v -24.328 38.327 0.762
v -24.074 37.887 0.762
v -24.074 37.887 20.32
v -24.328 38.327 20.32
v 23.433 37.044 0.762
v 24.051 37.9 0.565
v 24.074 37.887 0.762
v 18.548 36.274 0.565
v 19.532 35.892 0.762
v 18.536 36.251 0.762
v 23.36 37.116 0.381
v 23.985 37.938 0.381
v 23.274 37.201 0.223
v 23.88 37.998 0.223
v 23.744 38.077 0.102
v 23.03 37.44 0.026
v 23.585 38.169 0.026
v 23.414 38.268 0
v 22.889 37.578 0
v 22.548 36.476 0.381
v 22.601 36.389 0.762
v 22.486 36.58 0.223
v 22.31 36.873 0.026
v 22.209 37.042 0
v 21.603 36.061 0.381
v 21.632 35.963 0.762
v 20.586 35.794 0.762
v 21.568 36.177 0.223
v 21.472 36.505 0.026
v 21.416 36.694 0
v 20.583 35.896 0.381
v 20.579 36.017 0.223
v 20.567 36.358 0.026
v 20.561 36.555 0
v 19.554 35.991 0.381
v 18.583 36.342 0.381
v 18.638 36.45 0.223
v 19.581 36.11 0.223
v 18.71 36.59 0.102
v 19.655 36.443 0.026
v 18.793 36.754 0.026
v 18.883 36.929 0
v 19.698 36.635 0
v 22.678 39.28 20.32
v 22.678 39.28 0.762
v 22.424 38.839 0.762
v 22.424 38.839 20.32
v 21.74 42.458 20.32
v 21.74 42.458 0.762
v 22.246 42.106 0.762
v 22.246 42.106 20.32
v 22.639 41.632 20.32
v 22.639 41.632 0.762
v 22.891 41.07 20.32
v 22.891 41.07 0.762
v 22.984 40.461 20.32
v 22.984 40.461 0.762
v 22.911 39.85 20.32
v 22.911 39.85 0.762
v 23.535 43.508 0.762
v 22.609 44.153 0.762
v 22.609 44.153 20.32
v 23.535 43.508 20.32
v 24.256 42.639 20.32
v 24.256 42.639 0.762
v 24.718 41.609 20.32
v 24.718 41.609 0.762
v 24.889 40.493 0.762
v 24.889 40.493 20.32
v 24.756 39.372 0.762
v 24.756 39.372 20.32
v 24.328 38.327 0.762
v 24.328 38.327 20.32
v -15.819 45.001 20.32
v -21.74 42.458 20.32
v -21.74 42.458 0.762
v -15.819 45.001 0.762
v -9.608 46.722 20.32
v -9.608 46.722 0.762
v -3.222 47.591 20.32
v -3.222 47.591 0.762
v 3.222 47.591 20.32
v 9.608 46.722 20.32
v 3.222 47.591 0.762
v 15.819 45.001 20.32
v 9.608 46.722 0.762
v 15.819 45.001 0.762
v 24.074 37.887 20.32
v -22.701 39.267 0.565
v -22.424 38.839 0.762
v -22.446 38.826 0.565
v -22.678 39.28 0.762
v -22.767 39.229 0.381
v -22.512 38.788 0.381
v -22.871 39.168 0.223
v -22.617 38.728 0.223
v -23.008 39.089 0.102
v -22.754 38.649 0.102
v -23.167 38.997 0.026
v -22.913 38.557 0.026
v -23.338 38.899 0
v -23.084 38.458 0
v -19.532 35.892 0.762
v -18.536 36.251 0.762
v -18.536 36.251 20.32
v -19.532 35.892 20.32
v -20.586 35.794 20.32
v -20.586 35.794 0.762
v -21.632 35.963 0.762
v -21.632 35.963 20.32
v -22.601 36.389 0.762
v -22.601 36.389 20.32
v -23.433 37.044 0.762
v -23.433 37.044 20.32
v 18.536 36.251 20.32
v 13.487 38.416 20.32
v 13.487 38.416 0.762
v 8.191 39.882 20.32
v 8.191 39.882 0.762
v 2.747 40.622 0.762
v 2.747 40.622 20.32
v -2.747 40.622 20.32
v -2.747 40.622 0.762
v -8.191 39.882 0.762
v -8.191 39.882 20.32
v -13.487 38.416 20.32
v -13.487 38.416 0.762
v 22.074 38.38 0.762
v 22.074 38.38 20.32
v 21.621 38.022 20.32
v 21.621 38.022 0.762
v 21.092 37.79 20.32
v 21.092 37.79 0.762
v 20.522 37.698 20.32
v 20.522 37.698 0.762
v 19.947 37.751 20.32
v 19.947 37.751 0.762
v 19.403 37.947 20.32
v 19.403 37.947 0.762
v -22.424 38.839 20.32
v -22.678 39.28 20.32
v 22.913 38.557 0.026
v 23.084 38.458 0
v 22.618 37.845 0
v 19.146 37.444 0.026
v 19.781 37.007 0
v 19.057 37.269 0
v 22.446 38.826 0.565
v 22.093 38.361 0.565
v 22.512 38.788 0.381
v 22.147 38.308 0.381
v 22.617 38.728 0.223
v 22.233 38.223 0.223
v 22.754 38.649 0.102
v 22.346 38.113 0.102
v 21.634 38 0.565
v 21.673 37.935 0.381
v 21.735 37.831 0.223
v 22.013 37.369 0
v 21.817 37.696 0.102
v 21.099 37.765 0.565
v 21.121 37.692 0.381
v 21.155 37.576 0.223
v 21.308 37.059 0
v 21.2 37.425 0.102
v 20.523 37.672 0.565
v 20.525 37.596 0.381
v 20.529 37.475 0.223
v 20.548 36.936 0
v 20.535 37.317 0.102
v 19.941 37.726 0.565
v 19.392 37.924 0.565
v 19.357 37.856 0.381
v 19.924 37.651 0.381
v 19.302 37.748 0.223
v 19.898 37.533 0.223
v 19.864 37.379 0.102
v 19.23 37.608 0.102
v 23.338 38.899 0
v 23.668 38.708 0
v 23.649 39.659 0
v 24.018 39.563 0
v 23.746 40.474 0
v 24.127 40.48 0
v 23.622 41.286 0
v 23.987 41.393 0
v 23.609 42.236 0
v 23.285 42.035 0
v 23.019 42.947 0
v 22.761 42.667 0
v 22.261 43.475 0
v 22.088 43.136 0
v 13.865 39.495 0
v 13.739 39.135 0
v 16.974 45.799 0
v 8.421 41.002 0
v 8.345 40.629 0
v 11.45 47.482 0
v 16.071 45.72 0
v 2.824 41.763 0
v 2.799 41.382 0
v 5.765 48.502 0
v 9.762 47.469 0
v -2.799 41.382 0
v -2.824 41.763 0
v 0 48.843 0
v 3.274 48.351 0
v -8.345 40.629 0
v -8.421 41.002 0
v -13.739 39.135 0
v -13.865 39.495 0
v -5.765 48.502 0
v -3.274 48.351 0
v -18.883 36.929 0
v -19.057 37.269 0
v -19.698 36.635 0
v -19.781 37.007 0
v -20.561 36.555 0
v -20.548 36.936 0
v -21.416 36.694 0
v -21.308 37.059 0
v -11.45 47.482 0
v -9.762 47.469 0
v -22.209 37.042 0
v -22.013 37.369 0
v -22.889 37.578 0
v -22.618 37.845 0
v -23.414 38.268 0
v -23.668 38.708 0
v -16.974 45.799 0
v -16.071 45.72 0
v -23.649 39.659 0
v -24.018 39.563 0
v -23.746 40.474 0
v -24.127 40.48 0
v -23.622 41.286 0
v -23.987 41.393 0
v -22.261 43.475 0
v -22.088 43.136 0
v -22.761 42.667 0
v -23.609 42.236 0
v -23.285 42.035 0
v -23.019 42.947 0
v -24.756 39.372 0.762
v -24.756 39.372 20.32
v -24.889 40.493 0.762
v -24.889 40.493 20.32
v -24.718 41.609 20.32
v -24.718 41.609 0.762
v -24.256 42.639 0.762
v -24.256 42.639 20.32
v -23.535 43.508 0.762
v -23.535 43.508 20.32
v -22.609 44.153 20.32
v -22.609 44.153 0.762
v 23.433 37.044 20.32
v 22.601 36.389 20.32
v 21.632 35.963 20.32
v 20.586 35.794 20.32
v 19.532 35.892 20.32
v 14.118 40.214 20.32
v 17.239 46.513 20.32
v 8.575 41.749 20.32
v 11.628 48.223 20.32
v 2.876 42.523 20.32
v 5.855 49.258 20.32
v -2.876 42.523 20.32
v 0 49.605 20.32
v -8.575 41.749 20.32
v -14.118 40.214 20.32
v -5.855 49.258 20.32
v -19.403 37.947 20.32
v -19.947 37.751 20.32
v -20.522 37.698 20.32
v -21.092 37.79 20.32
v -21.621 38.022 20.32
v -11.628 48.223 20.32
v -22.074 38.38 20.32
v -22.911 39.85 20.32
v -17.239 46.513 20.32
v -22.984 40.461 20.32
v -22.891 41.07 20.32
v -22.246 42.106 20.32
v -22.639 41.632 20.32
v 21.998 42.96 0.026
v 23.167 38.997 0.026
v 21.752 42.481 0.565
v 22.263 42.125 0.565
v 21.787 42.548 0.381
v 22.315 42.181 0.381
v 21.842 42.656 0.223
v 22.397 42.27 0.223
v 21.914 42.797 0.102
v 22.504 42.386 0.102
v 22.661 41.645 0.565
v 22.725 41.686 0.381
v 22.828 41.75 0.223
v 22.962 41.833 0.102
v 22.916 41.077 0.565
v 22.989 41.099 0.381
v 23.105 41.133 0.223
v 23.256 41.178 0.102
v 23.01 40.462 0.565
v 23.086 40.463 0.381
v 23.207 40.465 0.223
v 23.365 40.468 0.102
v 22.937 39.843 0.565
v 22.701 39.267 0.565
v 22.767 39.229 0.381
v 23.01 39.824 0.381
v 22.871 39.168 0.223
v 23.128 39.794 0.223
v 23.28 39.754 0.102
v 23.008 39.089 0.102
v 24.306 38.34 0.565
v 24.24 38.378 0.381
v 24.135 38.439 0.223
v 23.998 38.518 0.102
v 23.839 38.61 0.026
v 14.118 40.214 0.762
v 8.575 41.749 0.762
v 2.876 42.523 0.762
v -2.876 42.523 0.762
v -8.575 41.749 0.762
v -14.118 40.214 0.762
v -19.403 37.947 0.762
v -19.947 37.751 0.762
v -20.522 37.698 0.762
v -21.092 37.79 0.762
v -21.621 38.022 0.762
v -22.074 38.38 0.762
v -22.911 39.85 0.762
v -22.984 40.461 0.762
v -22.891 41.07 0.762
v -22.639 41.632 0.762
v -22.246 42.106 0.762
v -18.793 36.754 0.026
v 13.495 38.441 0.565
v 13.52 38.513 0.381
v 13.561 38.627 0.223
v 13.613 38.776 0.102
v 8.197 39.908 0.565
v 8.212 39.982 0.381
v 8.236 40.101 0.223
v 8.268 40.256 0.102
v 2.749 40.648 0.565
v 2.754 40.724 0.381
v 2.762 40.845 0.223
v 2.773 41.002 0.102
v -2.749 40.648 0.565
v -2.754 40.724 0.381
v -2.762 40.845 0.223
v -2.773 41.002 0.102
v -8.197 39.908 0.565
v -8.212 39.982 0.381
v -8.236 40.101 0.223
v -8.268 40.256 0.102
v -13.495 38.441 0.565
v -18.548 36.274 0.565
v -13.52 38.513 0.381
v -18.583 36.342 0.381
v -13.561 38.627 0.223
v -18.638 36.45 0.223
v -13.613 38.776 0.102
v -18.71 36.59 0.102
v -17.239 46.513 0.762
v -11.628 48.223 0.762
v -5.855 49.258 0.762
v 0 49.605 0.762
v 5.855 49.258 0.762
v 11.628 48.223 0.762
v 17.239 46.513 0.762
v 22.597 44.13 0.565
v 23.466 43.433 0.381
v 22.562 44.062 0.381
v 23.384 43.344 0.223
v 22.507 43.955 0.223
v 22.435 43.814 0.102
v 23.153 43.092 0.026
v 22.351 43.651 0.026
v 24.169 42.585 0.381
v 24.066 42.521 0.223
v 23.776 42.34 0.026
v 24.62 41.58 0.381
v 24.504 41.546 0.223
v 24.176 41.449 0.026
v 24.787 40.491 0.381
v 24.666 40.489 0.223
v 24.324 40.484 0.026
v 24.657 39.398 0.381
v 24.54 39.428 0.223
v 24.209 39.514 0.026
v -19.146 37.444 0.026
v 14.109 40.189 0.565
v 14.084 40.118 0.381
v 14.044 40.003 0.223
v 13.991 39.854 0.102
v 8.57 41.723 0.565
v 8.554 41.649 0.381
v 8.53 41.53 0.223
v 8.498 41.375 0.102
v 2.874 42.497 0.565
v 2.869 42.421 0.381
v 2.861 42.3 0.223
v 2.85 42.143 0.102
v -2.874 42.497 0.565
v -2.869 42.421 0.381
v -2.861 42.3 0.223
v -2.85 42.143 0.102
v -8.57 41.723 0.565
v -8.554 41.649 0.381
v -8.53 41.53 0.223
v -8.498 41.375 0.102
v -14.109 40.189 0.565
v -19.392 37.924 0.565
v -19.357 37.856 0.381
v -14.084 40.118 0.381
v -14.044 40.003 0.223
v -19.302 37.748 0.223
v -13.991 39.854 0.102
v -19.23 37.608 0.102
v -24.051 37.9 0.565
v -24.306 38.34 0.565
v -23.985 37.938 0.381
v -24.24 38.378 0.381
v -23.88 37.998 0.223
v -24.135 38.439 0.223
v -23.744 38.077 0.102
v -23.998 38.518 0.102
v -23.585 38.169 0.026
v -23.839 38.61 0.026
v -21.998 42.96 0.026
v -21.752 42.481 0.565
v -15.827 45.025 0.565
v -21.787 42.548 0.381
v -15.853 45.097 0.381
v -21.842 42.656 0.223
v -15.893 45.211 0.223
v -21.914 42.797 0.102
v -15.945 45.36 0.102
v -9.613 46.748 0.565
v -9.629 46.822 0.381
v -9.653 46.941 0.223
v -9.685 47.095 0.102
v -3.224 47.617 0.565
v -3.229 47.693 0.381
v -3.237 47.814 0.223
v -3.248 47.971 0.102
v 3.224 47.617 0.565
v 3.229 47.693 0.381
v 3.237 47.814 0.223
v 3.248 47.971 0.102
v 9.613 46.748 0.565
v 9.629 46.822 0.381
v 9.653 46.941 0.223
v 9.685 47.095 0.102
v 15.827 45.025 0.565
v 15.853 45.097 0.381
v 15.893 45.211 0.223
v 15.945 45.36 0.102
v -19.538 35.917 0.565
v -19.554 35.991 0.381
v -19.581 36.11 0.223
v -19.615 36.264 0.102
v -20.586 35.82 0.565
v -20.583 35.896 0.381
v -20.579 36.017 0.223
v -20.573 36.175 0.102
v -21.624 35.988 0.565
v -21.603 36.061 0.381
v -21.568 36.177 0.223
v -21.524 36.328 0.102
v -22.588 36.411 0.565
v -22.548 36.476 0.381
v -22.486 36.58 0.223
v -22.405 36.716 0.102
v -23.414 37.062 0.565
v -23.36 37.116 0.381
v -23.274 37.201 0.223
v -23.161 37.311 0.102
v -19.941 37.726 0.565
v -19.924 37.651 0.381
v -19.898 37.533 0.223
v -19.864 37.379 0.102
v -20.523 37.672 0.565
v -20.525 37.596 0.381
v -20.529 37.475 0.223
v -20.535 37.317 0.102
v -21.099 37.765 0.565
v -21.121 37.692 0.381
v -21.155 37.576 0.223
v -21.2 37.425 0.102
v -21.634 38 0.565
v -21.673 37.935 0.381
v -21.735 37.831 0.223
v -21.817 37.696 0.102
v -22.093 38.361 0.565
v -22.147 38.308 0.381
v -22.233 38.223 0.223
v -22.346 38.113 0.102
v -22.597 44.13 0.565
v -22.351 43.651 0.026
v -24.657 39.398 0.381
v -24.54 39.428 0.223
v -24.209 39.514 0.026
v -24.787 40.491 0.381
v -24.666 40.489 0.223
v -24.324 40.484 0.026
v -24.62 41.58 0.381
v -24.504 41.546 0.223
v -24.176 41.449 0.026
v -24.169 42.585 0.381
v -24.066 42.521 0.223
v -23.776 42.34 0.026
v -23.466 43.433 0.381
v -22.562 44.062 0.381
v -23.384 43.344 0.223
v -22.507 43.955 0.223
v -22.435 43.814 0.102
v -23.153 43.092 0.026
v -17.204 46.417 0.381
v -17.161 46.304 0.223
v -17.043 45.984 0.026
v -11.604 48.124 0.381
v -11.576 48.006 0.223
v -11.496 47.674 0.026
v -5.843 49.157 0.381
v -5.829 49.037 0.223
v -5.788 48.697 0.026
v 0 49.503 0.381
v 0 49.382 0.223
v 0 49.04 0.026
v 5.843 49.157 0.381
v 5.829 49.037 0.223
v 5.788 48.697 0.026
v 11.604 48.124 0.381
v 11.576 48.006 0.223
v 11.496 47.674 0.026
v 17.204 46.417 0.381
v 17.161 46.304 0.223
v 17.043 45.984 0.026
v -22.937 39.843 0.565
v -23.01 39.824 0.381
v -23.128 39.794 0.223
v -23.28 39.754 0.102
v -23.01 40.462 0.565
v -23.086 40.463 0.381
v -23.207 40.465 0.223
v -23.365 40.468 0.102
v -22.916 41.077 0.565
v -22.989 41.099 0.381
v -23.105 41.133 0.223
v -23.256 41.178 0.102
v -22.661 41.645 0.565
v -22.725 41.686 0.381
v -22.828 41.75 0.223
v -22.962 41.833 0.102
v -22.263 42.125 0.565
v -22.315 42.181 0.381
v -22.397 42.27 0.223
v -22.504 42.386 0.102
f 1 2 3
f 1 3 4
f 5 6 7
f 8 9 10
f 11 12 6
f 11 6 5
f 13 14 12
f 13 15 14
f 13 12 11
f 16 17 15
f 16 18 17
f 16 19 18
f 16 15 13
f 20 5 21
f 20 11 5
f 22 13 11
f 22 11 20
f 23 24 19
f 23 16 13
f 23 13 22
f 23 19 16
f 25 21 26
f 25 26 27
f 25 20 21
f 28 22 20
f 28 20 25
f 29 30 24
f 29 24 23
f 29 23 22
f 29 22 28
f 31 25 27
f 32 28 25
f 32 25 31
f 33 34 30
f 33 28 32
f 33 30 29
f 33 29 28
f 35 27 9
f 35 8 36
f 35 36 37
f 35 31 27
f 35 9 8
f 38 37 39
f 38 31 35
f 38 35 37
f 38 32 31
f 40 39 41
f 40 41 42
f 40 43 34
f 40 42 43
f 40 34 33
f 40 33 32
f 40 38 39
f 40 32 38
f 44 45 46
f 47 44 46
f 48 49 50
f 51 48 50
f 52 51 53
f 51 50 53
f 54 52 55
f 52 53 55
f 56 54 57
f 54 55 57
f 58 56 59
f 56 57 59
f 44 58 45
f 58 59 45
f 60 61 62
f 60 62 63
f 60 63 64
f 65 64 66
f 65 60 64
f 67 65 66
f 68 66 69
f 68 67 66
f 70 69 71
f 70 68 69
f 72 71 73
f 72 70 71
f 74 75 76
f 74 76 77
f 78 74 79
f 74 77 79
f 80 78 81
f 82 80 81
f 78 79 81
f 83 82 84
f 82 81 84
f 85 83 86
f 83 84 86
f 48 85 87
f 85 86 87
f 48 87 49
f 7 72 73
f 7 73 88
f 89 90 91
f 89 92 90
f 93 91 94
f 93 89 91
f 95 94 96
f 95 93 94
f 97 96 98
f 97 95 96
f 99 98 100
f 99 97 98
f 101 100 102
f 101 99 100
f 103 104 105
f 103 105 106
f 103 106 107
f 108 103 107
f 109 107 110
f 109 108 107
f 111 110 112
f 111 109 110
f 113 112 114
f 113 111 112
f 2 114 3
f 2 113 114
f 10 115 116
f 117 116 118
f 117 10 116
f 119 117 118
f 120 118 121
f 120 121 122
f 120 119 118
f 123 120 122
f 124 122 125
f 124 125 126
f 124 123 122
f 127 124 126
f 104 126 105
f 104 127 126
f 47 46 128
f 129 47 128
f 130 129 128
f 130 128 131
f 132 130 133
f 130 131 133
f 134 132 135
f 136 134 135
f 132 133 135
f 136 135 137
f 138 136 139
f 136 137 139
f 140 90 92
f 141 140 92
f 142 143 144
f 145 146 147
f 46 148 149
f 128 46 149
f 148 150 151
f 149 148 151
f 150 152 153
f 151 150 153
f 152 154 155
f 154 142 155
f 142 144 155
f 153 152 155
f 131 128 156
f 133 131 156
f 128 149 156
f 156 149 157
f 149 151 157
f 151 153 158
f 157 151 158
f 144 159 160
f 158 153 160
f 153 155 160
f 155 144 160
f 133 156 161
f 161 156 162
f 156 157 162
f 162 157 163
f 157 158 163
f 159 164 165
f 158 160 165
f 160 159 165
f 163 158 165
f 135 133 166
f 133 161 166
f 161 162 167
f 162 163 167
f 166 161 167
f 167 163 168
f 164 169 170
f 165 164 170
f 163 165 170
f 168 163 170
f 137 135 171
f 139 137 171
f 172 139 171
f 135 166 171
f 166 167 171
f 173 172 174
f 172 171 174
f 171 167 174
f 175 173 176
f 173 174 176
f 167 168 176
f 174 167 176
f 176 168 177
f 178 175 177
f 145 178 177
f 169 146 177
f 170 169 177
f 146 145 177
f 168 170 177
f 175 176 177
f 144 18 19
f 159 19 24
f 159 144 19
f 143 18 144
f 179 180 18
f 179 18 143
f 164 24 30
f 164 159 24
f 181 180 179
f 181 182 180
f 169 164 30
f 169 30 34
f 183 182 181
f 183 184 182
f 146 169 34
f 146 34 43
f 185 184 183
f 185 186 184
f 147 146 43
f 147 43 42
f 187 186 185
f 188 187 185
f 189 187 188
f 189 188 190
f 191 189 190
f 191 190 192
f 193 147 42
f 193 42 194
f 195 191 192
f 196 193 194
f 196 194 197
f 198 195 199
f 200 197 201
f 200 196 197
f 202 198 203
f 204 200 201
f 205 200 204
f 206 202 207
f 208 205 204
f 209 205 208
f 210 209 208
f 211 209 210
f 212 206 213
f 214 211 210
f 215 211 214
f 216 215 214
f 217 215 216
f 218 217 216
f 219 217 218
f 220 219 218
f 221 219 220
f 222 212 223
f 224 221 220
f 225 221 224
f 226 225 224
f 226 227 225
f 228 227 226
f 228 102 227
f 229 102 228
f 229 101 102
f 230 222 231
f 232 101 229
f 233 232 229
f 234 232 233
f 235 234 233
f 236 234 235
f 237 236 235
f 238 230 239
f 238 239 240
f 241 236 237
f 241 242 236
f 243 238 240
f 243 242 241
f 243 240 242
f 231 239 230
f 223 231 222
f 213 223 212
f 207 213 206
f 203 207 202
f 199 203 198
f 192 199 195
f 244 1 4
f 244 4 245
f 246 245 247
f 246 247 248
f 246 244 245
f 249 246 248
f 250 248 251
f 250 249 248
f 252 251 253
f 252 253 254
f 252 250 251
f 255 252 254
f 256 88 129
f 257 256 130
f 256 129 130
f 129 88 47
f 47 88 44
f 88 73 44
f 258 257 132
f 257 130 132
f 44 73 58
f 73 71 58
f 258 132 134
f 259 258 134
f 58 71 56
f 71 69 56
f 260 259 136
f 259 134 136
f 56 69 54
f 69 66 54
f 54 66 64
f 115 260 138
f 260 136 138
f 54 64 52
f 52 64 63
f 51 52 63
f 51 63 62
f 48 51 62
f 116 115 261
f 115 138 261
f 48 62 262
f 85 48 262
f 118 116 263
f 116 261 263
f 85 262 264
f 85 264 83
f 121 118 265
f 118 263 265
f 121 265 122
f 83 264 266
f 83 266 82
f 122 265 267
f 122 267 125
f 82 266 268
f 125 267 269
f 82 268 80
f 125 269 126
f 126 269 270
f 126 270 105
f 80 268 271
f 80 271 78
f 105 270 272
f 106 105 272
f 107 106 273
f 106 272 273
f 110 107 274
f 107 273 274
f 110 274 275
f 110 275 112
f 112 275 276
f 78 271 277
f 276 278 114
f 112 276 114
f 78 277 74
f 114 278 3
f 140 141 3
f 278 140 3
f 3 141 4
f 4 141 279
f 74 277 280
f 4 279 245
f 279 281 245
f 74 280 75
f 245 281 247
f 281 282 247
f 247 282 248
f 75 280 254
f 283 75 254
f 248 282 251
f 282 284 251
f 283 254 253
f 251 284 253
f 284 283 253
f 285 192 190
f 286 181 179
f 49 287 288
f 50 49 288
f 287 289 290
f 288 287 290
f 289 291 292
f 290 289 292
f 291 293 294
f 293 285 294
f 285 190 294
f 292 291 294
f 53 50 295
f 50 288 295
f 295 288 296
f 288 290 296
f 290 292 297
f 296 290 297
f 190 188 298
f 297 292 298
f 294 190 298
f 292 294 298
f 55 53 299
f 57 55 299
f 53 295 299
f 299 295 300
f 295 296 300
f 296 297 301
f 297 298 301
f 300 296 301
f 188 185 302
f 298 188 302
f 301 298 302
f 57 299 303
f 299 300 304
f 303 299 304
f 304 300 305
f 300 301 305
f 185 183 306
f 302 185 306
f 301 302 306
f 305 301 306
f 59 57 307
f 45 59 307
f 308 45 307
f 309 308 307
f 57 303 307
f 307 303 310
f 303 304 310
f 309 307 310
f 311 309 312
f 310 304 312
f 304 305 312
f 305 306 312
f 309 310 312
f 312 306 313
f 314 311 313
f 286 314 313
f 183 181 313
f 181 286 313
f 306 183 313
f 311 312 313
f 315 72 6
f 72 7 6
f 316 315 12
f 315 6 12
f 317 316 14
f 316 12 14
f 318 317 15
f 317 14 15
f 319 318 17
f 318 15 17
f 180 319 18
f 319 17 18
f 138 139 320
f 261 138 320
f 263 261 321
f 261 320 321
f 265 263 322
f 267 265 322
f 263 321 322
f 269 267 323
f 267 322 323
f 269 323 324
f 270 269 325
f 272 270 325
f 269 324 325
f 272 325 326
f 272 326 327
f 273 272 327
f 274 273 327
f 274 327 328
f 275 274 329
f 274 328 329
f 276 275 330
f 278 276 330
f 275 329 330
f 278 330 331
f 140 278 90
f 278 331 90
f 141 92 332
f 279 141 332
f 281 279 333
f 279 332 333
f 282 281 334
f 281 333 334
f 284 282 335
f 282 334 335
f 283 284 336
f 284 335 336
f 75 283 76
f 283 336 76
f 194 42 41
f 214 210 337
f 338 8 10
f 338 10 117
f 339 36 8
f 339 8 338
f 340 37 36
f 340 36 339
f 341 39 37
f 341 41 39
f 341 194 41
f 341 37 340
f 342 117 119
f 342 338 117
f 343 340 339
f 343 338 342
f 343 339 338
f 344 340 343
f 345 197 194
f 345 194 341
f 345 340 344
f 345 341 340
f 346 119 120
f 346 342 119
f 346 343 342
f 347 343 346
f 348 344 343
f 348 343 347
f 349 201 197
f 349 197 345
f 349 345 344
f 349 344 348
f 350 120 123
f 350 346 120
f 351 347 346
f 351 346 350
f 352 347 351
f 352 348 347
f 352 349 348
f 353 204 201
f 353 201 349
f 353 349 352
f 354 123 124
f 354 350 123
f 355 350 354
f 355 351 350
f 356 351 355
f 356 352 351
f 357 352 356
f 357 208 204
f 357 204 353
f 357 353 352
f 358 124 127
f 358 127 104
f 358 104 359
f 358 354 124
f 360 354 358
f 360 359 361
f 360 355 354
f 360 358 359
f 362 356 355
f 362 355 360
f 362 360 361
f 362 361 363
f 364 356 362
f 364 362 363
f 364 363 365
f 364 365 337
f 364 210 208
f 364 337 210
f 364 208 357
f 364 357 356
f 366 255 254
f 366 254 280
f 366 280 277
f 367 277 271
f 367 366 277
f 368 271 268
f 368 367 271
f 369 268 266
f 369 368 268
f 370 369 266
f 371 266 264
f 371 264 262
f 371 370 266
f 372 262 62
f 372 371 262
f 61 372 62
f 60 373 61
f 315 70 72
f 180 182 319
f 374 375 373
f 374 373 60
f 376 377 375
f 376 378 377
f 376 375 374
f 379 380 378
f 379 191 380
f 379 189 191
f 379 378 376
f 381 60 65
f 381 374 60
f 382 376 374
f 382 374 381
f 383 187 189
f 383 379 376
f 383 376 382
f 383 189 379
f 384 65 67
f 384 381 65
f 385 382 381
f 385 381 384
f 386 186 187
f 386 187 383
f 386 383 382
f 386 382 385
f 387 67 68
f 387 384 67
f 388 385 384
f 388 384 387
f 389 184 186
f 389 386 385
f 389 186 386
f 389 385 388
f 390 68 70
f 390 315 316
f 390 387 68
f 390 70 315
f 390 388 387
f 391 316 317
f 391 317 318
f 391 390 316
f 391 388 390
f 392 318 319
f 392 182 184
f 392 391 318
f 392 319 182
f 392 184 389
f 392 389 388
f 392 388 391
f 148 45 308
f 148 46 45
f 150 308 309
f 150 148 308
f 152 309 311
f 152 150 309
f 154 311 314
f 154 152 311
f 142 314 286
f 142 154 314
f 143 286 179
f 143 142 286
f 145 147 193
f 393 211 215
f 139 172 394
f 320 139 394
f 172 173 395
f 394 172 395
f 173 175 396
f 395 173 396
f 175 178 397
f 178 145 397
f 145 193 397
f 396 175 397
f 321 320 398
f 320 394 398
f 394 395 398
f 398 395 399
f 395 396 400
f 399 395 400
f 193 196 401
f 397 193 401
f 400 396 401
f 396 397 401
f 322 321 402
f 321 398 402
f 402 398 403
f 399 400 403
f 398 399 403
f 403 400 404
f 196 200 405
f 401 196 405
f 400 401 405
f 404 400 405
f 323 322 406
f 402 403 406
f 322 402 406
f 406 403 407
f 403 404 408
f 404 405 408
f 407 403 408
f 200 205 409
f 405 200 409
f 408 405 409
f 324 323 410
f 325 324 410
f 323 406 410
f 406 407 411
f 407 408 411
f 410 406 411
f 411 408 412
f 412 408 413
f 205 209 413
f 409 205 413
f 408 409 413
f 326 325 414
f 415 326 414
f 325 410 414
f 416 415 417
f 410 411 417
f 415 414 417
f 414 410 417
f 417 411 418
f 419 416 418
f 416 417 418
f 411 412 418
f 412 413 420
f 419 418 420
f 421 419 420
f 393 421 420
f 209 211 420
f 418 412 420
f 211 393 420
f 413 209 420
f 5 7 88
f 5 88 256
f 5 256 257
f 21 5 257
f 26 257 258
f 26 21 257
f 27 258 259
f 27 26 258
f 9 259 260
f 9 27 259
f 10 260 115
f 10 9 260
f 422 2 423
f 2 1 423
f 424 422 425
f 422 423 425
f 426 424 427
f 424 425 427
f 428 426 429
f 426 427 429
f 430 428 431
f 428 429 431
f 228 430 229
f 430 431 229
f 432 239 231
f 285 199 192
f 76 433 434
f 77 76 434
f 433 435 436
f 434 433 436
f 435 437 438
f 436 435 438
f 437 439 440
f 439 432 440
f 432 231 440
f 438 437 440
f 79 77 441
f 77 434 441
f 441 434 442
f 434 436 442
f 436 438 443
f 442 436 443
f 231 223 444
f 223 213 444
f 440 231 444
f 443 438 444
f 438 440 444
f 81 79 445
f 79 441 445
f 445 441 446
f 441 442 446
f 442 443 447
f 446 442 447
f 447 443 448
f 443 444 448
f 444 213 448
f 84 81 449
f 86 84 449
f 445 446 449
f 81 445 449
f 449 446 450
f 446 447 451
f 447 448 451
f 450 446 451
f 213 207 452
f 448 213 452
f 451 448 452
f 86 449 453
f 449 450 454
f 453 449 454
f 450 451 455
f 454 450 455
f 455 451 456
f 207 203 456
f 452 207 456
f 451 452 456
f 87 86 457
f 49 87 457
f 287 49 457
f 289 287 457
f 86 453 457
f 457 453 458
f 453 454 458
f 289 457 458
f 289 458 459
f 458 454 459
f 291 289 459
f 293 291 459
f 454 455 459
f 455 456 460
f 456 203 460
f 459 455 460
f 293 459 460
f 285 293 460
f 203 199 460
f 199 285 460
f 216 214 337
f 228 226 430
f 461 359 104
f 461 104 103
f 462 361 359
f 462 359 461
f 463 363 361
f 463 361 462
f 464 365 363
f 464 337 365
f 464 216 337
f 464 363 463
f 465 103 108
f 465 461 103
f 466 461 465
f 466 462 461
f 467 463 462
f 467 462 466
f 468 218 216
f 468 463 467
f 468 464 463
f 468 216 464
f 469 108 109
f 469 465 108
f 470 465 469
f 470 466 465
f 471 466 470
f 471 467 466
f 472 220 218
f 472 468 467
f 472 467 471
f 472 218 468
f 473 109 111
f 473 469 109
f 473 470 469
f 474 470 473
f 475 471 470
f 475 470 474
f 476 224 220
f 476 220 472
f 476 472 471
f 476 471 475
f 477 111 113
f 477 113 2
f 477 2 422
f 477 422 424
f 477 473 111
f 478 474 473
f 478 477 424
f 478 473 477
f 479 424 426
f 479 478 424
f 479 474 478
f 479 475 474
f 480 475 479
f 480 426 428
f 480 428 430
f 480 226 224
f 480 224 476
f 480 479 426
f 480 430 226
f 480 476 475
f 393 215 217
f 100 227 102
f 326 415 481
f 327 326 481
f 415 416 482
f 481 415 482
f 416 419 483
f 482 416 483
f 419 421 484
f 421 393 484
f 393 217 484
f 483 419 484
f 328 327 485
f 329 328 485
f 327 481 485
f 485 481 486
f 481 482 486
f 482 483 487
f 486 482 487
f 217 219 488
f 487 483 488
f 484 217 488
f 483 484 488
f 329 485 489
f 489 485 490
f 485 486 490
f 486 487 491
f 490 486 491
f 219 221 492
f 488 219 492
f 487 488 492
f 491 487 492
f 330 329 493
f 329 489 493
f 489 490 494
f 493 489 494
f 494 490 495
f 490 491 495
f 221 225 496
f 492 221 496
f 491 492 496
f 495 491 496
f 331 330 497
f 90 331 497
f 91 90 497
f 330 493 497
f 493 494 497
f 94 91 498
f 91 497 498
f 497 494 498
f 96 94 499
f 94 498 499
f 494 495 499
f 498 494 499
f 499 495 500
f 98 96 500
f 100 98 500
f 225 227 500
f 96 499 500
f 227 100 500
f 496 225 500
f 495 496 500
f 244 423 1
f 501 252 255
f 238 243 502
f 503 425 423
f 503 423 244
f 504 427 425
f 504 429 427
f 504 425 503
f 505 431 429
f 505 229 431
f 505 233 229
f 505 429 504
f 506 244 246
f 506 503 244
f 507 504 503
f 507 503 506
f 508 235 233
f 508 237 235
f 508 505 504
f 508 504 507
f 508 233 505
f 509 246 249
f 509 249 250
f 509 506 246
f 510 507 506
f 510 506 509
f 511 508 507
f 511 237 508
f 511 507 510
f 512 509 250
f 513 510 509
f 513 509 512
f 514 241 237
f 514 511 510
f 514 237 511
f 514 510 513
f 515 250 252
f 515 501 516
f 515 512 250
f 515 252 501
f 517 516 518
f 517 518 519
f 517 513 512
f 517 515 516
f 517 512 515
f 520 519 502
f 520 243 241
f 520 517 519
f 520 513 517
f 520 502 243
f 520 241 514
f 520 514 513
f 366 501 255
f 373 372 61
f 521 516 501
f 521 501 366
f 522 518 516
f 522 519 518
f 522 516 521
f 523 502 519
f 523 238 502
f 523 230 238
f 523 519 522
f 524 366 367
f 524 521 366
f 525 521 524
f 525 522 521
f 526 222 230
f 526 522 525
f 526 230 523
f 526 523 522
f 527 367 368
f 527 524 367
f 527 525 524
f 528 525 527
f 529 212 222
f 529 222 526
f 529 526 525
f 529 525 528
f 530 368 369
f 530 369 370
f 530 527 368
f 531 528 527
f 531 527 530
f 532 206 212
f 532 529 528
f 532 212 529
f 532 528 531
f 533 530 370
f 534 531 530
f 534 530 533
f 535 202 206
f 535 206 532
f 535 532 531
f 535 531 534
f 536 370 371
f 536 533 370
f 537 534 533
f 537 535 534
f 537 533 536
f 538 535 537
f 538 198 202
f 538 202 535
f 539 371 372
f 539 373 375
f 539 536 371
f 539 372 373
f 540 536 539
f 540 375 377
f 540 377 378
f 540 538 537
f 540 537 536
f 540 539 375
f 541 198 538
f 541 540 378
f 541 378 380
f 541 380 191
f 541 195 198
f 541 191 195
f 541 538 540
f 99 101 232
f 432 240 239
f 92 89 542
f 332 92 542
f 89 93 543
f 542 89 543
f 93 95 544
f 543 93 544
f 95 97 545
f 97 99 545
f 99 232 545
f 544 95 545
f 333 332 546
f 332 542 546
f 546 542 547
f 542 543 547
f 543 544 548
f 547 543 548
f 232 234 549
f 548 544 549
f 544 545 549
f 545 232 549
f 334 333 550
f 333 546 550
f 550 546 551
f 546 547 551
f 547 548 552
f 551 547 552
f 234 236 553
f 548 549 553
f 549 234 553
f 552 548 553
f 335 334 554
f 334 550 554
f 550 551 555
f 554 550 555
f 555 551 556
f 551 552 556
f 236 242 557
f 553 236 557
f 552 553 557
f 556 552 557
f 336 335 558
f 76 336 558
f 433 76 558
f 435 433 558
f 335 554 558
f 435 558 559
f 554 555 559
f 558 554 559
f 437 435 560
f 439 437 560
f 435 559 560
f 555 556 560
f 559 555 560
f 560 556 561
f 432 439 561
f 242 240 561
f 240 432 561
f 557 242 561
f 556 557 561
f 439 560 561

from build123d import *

# Parameters (mm, degrees)
EXTRUDE_THIN2_DEPTH = 20.32
FILLET2_R           = 0.762


with BuildPart() as part:
    # Sketch1 → Extrude-Thin2 (new body)
    with BuildSketch(Plane.XY):
        with BuildLine():
            Line((24.32799261, 38.327319246), (24.073666549, 37.886813588))
            ThreePointArc((24.073666549, 37.886813588), (21.631585853, 35.963049129), (18.536136228, 36.250832801))
            ThreePointArc((18.536136228, 36.250832801), (0, 40.715), (-18.536136228, 36.250832801))
            ThreePointArc((-18.536136228, 36.250832801), (-21.631585853, 35.963049129), (-24.073666549, 37.886813588))
            Line((-24.073666549, 37.886813588), (-24.32799261, 38.327319246))
            ThreePointArc((-24.32799261, 38.327319246), (-24.718082956, 41.60910514), (-22.608625258, 44.153211536))
            ThreePointArc((-22.608625258, 44.153211536), (0, 49.605), (22.608625258, 44.153211536))
            ThreePointArc((22.608625258, 44.153211536), (24.718082956, 41.60910514), (24.32799261, 38.327319246))
        make_face()
        with BuildLine():
            Line((22.678214215, 39.279819246), (22.423888155, 38.839313588))
            ThreePointArc((22.423888155, 38.839313588), (21.091844139, 37.78998752), (19.403417071, 37.946960431))
            ThreePointArc((19.403417071, 37.946960431), (0, 42.62), (-19.403417071, 37.946960431))
            ThreePointArc((-19.403417071, 37.946960431), (-21.091844139, 37.78998752), (-22.423888155, 38.839313588))
            Line((-22.423888155, 38.839313588), (-22.678214215, 39.279819246))
            ThreePointArc((-22.678214215, 39.279819246), (-22.890990768, 41.069884279), (-21.740377478, 42.457578677))
            ThreePointArc((-21.740377478, 42.457578677), (0, 47.7), (21.740377478, 42.457578677))
            ThreePointArc((21.740377478, 42.457578677), (22.890990768, 41.069884279), (22.678214215, 39.279819246))
        make_face(mode=Mode.SUBTRACT)
    extrude(amount=EXTRUDE_THIN2_DEPTH)

    # Fillet2
    fillet2_edges = [part.edges().sort_by_distance(p)[0] for p in [
        (-21.091844139, 37.78998752, 0),
        (0, 42.62, 0),
        (21.091844139, 37.78998752, 0),
        (22.551051185, 39.059566417, 0),
        (22.890990768, 41.069884279, 0),
        (0, 47.7, 0),
        (-22.890990768, 41.069884279, 0),
        (-22.551051185, 39.059566417, 0),
        (-24.20082958, 38.107066417, 0),
        (-24.718082956, 41.60910514, 0),
        (0, 49.605, 0),
        (24.718082956, 41.60910514, 0),
        (24.20082958, 38.107066417, 0),
        (21.631585853, 35.963049129, 0),
        (0, 40.715, 0),
        (-21.631585853, 35.963049129, 0),
    ]]
    fillet(fillet2_edges, radius=FILLET2_R)


solid = part.part
